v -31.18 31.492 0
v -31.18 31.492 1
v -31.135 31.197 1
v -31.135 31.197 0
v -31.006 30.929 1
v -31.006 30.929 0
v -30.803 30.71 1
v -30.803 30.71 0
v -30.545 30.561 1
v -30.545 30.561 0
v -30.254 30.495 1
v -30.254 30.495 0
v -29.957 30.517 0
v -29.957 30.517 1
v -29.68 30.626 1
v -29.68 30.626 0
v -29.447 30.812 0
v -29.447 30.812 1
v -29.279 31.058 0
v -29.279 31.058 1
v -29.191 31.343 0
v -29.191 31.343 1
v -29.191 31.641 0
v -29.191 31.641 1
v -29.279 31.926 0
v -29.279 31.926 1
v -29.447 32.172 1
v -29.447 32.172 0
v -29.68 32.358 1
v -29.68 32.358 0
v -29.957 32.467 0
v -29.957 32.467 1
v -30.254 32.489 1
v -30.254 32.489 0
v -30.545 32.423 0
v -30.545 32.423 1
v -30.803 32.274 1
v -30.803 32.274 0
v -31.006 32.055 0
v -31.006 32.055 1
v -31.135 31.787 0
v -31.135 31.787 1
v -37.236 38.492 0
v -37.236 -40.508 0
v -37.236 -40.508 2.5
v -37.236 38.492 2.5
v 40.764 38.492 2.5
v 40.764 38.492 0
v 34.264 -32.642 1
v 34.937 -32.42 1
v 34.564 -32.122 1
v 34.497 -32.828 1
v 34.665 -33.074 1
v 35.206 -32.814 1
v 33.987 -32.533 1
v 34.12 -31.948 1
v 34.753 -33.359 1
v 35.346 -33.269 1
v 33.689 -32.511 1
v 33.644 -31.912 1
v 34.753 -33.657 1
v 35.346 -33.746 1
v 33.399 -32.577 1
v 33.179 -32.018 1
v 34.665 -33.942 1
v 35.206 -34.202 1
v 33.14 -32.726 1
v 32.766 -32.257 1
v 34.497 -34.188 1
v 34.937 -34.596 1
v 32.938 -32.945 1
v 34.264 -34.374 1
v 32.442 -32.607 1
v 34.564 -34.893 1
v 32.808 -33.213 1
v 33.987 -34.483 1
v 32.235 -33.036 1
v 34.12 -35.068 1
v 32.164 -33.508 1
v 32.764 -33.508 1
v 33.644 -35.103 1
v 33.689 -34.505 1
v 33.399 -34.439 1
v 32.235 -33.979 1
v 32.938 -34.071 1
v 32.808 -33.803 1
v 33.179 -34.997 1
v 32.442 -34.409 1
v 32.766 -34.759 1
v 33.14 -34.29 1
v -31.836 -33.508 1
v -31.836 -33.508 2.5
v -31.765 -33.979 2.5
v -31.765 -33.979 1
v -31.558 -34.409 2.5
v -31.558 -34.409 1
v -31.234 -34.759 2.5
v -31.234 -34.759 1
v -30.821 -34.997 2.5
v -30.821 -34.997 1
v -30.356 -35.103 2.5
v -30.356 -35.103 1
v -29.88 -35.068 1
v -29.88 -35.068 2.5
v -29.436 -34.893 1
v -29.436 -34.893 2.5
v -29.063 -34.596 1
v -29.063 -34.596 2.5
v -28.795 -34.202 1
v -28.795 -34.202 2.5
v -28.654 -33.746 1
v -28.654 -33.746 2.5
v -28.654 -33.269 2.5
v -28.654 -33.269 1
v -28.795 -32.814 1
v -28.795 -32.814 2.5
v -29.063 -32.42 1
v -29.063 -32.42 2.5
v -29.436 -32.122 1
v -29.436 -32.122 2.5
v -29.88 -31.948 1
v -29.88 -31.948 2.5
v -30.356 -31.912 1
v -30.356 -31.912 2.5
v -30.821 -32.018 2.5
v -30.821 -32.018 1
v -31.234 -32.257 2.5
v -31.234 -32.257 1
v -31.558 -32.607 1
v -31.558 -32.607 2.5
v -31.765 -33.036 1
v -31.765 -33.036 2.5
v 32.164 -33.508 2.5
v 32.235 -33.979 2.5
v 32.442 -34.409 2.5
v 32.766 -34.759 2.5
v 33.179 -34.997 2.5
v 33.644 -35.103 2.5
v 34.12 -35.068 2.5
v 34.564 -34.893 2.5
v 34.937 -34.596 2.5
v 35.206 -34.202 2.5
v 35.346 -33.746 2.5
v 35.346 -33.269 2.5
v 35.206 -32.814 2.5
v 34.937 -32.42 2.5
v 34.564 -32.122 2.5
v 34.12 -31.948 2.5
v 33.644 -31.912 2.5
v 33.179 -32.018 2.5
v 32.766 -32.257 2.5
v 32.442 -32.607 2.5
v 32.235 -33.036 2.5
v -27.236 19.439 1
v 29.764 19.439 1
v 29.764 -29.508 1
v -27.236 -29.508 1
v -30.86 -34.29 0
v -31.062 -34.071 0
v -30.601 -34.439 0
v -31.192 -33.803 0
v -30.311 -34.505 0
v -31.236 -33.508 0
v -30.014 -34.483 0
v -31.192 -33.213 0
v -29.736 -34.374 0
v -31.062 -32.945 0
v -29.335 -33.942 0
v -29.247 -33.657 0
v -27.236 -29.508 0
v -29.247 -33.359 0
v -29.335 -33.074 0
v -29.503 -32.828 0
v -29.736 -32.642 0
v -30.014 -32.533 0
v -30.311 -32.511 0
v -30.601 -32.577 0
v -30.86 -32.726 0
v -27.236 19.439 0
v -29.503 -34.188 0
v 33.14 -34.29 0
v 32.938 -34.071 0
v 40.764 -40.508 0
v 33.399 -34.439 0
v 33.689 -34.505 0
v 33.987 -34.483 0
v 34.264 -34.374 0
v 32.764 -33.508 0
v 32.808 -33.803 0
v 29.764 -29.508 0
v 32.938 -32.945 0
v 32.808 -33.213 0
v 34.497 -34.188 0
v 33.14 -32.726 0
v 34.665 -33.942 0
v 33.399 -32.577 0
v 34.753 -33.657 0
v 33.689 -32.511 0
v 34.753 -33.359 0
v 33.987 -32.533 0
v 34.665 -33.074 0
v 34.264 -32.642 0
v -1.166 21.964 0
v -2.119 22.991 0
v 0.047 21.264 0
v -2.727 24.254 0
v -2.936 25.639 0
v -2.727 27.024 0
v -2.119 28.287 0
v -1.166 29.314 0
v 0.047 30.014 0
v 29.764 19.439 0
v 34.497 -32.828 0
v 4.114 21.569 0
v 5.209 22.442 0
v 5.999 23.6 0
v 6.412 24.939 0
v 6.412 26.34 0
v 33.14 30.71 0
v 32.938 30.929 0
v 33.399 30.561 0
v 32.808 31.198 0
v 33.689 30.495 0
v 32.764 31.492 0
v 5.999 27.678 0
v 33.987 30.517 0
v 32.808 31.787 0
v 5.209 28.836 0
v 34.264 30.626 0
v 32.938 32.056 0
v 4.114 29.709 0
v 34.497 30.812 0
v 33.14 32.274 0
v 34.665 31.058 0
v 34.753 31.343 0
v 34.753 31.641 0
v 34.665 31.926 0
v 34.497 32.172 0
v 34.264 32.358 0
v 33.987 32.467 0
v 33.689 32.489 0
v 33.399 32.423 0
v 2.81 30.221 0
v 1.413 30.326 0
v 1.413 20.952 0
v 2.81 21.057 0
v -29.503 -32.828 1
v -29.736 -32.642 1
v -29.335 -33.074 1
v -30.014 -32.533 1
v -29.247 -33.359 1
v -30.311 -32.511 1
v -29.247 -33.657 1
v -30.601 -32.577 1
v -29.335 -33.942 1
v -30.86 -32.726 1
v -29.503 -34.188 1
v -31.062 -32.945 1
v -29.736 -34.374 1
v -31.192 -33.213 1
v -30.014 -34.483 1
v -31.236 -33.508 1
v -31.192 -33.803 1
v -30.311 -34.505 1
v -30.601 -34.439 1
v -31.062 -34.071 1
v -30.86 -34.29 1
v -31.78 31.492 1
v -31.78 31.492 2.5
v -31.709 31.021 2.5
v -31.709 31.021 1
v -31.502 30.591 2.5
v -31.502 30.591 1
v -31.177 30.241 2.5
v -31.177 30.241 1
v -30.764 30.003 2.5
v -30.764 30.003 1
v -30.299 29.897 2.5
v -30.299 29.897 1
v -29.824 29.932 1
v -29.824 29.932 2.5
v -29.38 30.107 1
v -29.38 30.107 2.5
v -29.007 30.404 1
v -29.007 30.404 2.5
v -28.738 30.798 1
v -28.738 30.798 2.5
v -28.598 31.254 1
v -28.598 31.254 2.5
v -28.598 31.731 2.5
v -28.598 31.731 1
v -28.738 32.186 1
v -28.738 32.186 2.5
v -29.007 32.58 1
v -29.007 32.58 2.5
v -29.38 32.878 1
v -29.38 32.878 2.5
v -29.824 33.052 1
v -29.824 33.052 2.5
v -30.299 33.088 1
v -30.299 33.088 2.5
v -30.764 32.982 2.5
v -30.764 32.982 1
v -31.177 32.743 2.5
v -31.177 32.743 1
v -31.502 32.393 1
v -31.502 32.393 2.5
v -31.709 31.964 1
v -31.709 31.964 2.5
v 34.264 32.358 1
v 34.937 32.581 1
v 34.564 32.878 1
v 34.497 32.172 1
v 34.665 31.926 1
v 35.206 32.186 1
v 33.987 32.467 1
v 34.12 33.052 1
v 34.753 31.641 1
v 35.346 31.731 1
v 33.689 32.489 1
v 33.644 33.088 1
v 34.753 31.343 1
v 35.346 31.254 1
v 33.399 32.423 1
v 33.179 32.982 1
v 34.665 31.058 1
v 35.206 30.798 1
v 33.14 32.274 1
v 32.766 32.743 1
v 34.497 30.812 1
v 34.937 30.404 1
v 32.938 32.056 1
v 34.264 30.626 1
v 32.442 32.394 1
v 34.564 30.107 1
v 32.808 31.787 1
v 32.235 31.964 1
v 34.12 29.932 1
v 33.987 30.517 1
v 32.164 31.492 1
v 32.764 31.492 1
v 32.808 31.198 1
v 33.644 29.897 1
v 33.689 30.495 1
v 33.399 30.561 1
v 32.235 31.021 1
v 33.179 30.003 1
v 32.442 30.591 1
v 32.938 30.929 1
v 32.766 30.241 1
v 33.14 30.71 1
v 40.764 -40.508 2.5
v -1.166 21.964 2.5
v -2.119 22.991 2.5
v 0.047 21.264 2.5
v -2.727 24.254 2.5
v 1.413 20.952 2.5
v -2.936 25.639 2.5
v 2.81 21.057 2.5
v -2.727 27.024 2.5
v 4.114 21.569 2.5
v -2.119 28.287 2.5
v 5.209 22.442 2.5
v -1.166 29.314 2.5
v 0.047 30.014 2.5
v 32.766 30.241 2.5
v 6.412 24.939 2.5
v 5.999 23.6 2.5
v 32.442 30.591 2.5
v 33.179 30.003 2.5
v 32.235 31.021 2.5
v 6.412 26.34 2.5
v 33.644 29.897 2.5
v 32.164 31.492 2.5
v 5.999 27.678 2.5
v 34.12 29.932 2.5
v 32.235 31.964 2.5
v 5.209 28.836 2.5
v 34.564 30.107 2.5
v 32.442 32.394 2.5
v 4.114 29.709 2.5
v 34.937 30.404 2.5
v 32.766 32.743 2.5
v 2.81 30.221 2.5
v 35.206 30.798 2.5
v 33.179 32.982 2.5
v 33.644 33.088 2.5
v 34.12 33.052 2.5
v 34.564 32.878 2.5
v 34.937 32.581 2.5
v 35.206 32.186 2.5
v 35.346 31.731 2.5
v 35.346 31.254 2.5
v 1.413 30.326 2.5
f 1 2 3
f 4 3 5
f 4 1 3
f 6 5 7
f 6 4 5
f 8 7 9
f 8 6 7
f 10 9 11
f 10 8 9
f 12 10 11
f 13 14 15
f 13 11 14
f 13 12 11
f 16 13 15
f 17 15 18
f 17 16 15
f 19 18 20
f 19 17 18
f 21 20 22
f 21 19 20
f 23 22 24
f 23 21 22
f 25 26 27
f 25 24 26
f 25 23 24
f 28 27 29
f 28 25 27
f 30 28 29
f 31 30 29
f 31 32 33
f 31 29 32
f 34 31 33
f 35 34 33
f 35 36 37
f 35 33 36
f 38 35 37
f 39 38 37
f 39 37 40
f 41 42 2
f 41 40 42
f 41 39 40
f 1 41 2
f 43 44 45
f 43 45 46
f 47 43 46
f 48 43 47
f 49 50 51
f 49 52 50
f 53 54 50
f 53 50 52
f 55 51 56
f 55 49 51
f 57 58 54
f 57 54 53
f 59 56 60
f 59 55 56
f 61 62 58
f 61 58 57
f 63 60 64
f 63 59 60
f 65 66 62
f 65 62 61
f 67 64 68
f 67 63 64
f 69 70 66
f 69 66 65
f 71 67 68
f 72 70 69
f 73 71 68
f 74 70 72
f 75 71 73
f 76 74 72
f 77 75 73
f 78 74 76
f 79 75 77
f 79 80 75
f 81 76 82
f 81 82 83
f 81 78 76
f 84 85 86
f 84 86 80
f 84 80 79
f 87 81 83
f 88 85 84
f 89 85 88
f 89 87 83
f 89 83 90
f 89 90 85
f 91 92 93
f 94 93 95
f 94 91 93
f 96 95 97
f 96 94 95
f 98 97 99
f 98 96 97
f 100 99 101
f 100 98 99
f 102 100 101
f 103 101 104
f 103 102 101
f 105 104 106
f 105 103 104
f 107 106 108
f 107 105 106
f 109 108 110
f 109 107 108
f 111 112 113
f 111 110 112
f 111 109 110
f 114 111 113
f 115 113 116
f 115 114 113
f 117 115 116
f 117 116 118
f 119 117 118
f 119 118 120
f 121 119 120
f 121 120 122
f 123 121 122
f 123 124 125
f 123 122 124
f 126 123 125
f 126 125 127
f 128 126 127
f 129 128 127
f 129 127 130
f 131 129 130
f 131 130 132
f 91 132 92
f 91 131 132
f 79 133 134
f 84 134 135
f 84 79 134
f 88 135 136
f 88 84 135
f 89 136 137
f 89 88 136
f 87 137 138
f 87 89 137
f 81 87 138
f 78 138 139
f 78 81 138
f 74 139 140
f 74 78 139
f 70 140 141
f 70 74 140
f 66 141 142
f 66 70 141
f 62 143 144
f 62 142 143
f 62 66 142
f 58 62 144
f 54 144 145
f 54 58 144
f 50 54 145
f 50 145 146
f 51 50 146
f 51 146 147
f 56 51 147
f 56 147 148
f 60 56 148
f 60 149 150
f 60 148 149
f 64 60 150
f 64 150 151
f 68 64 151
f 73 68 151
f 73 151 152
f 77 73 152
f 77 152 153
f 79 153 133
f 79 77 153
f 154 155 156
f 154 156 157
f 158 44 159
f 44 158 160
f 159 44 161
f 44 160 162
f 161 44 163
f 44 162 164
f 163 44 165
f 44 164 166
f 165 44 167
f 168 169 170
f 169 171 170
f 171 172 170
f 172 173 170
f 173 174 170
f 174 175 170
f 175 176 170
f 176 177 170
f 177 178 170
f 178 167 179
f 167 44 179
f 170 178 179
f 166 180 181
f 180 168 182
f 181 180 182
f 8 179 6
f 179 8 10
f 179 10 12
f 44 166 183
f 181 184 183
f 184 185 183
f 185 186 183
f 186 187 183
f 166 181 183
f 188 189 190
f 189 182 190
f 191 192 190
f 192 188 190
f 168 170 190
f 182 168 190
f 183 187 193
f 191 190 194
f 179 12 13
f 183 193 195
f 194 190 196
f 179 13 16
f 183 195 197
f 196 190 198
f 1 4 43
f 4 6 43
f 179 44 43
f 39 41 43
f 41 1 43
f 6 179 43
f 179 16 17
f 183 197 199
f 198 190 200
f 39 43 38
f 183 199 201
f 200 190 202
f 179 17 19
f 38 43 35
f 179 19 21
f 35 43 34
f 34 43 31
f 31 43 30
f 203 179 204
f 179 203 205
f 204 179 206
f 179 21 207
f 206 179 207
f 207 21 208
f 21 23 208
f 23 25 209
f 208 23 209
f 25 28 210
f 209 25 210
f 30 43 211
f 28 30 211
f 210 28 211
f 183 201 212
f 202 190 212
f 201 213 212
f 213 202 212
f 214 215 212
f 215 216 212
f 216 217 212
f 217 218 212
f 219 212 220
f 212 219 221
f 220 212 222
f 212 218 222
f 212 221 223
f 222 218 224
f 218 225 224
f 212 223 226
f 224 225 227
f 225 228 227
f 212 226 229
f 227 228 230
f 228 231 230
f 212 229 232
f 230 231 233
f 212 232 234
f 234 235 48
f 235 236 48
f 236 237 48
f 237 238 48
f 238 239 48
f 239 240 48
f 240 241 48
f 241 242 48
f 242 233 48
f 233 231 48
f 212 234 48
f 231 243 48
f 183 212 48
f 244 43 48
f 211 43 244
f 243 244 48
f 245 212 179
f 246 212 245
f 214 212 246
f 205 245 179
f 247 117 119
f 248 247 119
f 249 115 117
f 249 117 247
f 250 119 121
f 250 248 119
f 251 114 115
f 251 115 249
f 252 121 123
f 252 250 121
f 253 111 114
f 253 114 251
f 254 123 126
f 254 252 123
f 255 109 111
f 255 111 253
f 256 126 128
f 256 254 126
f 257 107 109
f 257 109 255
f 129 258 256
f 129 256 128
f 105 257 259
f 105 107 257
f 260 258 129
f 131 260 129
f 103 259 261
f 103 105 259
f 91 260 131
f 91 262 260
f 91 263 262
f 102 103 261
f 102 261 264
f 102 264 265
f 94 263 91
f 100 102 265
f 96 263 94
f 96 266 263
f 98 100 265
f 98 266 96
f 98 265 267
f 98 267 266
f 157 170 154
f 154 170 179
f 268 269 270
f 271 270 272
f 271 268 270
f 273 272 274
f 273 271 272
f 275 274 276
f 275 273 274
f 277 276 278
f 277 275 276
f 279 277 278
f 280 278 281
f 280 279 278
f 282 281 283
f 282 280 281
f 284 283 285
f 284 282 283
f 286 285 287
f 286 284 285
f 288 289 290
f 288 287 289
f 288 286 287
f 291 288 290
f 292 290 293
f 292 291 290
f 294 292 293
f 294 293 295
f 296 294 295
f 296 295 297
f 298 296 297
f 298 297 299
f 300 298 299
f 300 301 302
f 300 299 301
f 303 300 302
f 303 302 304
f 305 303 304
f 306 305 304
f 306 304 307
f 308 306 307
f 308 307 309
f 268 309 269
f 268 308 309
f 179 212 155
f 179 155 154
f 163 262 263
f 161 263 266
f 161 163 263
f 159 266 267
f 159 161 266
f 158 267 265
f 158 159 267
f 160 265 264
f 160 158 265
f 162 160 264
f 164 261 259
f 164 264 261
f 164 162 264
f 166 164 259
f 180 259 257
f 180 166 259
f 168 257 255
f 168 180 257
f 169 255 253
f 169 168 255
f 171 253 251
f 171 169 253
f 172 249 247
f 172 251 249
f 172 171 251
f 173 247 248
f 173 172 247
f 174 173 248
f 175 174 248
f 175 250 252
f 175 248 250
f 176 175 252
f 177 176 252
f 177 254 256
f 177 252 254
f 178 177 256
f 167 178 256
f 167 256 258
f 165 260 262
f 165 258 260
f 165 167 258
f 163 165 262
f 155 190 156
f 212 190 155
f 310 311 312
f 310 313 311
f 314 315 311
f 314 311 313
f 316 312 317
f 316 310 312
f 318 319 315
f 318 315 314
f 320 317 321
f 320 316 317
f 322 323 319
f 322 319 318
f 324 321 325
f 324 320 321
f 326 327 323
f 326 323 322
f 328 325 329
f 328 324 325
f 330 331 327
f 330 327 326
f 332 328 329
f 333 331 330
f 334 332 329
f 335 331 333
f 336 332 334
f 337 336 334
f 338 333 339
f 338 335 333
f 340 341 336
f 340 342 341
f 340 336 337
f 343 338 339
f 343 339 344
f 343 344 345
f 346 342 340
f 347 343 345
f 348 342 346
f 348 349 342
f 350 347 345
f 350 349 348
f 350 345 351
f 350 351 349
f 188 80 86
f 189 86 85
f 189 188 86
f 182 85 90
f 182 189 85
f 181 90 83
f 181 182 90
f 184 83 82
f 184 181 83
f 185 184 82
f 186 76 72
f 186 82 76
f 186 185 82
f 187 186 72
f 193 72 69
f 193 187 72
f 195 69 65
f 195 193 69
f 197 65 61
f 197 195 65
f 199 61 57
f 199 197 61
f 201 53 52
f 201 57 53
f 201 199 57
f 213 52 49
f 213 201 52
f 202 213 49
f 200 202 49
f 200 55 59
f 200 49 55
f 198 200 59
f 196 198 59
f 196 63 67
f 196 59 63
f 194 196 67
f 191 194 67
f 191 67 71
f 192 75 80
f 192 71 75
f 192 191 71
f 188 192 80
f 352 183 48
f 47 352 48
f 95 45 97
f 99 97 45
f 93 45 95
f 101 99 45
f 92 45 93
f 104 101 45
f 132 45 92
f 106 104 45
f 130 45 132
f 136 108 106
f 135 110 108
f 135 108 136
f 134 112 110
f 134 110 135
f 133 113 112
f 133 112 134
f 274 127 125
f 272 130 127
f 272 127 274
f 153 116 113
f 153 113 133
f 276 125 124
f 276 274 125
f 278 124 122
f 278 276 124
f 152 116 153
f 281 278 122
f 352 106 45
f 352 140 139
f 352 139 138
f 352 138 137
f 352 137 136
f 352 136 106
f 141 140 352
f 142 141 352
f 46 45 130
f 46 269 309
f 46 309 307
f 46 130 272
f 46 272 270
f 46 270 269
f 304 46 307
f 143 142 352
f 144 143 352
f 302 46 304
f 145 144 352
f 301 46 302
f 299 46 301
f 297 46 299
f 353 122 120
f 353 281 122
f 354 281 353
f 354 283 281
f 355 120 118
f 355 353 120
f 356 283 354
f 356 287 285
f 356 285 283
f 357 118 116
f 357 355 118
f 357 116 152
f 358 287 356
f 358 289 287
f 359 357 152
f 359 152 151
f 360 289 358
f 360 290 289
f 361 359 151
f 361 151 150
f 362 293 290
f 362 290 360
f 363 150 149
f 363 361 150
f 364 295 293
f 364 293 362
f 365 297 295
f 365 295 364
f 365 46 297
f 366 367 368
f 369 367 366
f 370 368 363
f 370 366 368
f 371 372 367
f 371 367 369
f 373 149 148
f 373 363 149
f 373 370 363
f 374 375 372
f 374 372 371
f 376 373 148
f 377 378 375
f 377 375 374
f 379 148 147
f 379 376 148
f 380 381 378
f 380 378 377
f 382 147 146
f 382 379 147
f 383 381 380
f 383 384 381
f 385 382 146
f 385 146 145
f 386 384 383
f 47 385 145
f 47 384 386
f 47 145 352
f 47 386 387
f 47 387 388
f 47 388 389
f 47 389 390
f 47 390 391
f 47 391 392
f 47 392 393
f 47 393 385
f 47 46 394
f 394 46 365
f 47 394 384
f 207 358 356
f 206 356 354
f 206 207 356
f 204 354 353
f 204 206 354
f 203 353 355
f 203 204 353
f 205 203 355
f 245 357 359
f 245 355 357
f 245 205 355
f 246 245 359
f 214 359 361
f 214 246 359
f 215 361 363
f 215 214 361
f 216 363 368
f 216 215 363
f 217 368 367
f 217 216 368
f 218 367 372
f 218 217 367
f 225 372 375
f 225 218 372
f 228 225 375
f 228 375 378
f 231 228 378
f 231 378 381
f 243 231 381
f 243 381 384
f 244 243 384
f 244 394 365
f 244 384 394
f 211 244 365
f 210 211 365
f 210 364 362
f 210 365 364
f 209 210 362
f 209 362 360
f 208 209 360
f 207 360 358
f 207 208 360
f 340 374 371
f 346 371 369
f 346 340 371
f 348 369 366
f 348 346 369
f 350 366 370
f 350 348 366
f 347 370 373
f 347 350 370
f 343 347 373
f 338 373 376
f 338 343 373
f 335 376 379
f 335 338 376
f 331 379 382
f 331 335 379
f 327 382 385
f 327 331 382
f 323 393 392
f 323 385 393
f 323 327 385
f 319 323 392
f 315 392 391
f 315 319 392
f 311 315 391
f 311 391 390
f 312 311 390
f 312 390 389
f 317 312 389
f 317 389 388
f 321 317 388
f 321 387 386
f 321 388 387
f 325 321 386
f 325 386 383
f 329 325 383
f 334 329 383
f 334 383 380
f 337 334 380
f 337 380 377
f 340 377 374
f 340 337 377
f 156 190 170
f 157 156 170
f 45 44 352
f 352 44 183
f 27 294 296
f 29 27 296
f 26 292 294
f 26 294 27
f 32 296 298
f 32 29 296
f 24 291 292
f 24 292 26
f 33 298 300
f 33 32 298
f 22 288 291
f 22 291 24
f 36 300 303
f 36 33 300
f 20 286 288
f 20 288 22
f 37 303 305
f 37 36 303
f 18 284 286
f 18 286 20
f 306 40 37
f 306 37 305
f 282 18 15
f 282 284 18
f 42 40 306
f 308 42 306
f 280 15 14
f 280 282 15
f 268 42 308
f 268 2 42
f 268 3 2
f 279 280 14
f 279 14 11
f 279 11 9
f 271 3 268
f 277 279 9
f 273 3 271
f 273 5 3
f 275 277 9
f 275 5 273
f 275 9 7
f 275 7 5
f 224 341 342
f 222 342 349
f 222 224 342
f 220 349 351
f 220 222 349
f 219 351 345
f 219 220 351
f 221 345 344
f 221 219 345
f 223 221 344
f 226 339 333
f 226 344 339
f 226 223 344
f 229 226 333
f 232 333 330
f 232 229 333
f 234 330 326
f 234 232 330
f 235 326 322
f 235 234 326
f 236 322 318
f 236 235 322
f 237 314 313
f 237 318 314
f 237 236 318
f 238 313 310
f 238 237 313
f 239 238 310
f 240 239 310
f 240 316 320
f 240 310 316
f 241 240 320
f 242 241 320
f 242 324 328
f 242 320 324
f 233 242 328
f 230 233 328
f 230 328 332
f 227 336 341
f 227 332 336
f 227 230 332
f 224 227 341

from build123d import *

# Parameters (mm, degrees)
SKETCH_213_W        = 78
SKETCH_213_H        = 79
EXTRUDE_3_DEPTH     = 2.5
CUT_EXTRUDE_4_REACH = 59.522
SKETCH_10_R         = 1.00000254
SKETCH_10_R_2       = 4.7
CUT_EXTRUDE_START   = 1
SKETCH_12_R         = 1.6
CUT_EXTRUDE_6_DEPTH = 2.5
SKETCH_11_W         = 57.00006223
SKETCH_11_H         = 48.946928069
CUT_EXTRUDE_7_DEPTH = 1


with BuildPart() as part:
    # Sketch 213 → 凸台-拉伸3 (new body)
    with BuildSketch(Plane.XY):
        with Locations((1.76392246, -1.007858704)):
            Rectangle(SKETCH_213_W, SKETCH_213_H)
    extrude(amount=EXTRUDE_3_DEPTH)

    # Sketch 10 → 切除-拉伸4 (cut, up to next)
    with BuildSketch(Plane.XY, mode=Mode.PRIVATE) as cut_extrude_4_sk1:
        with Locations((-30.179759278, 31.492141296)):
            Circle(SKETCH_10_R)
    cut_extrude_4_tool1 = extrude(cut_extrude_4_sk1.sketch, amount=CUT_EXTRUDE_4_REACH, mode=Mode.PRIVATE) & part.part
    # Sketch 10 → 切除-拉伸4 (cut, up to next)
    with BuildSketch(Plane.XY, mode=Mode.PRIVATE) as cut_extrude_4_sk2:
        with Locations((33.76398723, 31.492283536)):
            Circle(SKETCH_10_R)
    cut_extrude_4_tool2 = extrude(cut_extrude_4_sk2.sketch, amount=CUT_EXTRUDE_4_REACH, mode=Mode.PRIVATE) & part.part
    # Sketch 10 → 切除-拉伸4 (cut, up to next)
    with BuildSketch(Plane.XY, mode=Mode.PRIVATE) as cut_extrude_4_sk3:
        with Locations((33.76398723, -33.507848544)):
            Circle(SKETCH_10_R)
    cut_extrude_4_tool3 = extrude(cut_extrude_4_sk3.sketch, amount=CUT_EXTRUDE_4_REACH, mode=Mode.PRIVATE) & part.part
    # Sketch 10 → 切除-拉伸4 (cut, up to next)
    with BuildSketch(Plane.XY, mode=Mode.PRIVATE) as cut_extrude_4_sk4:
        with Locations((-30.23614231, -33.507848544)):
            Circle(SKETCH_10_R)
    cut_extrude_4_tool4 = extrude(cut_extrude_4_sk4.sketch, amount=CUT_EXTRUDE_4_REACH, mode=Mode.PRIVATE) & part.part
    # Sketch 10 → 切除-拉伸4 (cut, up to next)
    with BuildSketch(Plane.XY, mode=Mode.PRIVATE) as cut_extrude_4_sk5:
        with Locations((1.764114511, 25.639082065)):
            Circle(SKETCH_10_R_2)
    cut_extrude_4_tool5 = extrude(cut_extrude_4_sk5.sketch, amount=CUT_EXTRUDE_4_REACH, mode=Mode.PRIVATE) & part.part
    add(cut_extrude_4_tool1.solids().sort_by_distance((-30.179759, 31.492141, 0))[0], mode=Mode.SUBTRACT)
    add(cut_extrude_4_tool2.solids().sort_by_distance((33.763987, 31.492284, 0))[0], mode=Mode.SUBTRACT)
    add(cut_extrude_4_tool3.solids().sort_by_distance((33.763987, -33.507849, 0))[0], mode=Mode.SUBTRACT)
    add(cut_extrude_4_tool4.solids().sort_by_distance((-30.236142, -33.507849, 0))[0], mode=Mode.SUBTRACT)
    add(cut_extrude_4_tool5.solids().sort_by_distance((1.764115, 25.639082, 0))[0], mode=Mode.SUBTRACT)

    # 外壳尺寸<12> → 切除-拉伸6 (cut)
    with BuildSketch(Plane.XY.offset(CUT_EXTRUDE_START)):
        with Locations((-30.179759278, 31.492141296)):
            Circle(SKETCH_12_R)
        with Locations((33.76398723, 31.492283536)):
            Circle(SKETCH_12_R)
        with Locations((-30.23614231, -33.507848544)):
            Circle(SKETCH_12_R)
        with Locations((33.76398723, -33.507848544)):
            Circle(SKETCH_12_R)
    extrude(amount=CUT_EXTRUDE_6_DEPTH, mode=Mode.SUBTRACT)

    # 草图11 → 切除-拉伸7 (cut)
    with BuildSketch(Plane(origin=(0, 0, 0), x_dir=(-1, 0, 0), z_dir=(0, 0, -1))):
        with Locations((-1.263953575, -5.03438197)):
            Rectangle(SKETCH_11_W, SKETCH_11_H)
    extrude(amount=-CUT_EXTRUDE_7_DEPTH, mode=Mode.SUBTRACT)


solid = part.part
